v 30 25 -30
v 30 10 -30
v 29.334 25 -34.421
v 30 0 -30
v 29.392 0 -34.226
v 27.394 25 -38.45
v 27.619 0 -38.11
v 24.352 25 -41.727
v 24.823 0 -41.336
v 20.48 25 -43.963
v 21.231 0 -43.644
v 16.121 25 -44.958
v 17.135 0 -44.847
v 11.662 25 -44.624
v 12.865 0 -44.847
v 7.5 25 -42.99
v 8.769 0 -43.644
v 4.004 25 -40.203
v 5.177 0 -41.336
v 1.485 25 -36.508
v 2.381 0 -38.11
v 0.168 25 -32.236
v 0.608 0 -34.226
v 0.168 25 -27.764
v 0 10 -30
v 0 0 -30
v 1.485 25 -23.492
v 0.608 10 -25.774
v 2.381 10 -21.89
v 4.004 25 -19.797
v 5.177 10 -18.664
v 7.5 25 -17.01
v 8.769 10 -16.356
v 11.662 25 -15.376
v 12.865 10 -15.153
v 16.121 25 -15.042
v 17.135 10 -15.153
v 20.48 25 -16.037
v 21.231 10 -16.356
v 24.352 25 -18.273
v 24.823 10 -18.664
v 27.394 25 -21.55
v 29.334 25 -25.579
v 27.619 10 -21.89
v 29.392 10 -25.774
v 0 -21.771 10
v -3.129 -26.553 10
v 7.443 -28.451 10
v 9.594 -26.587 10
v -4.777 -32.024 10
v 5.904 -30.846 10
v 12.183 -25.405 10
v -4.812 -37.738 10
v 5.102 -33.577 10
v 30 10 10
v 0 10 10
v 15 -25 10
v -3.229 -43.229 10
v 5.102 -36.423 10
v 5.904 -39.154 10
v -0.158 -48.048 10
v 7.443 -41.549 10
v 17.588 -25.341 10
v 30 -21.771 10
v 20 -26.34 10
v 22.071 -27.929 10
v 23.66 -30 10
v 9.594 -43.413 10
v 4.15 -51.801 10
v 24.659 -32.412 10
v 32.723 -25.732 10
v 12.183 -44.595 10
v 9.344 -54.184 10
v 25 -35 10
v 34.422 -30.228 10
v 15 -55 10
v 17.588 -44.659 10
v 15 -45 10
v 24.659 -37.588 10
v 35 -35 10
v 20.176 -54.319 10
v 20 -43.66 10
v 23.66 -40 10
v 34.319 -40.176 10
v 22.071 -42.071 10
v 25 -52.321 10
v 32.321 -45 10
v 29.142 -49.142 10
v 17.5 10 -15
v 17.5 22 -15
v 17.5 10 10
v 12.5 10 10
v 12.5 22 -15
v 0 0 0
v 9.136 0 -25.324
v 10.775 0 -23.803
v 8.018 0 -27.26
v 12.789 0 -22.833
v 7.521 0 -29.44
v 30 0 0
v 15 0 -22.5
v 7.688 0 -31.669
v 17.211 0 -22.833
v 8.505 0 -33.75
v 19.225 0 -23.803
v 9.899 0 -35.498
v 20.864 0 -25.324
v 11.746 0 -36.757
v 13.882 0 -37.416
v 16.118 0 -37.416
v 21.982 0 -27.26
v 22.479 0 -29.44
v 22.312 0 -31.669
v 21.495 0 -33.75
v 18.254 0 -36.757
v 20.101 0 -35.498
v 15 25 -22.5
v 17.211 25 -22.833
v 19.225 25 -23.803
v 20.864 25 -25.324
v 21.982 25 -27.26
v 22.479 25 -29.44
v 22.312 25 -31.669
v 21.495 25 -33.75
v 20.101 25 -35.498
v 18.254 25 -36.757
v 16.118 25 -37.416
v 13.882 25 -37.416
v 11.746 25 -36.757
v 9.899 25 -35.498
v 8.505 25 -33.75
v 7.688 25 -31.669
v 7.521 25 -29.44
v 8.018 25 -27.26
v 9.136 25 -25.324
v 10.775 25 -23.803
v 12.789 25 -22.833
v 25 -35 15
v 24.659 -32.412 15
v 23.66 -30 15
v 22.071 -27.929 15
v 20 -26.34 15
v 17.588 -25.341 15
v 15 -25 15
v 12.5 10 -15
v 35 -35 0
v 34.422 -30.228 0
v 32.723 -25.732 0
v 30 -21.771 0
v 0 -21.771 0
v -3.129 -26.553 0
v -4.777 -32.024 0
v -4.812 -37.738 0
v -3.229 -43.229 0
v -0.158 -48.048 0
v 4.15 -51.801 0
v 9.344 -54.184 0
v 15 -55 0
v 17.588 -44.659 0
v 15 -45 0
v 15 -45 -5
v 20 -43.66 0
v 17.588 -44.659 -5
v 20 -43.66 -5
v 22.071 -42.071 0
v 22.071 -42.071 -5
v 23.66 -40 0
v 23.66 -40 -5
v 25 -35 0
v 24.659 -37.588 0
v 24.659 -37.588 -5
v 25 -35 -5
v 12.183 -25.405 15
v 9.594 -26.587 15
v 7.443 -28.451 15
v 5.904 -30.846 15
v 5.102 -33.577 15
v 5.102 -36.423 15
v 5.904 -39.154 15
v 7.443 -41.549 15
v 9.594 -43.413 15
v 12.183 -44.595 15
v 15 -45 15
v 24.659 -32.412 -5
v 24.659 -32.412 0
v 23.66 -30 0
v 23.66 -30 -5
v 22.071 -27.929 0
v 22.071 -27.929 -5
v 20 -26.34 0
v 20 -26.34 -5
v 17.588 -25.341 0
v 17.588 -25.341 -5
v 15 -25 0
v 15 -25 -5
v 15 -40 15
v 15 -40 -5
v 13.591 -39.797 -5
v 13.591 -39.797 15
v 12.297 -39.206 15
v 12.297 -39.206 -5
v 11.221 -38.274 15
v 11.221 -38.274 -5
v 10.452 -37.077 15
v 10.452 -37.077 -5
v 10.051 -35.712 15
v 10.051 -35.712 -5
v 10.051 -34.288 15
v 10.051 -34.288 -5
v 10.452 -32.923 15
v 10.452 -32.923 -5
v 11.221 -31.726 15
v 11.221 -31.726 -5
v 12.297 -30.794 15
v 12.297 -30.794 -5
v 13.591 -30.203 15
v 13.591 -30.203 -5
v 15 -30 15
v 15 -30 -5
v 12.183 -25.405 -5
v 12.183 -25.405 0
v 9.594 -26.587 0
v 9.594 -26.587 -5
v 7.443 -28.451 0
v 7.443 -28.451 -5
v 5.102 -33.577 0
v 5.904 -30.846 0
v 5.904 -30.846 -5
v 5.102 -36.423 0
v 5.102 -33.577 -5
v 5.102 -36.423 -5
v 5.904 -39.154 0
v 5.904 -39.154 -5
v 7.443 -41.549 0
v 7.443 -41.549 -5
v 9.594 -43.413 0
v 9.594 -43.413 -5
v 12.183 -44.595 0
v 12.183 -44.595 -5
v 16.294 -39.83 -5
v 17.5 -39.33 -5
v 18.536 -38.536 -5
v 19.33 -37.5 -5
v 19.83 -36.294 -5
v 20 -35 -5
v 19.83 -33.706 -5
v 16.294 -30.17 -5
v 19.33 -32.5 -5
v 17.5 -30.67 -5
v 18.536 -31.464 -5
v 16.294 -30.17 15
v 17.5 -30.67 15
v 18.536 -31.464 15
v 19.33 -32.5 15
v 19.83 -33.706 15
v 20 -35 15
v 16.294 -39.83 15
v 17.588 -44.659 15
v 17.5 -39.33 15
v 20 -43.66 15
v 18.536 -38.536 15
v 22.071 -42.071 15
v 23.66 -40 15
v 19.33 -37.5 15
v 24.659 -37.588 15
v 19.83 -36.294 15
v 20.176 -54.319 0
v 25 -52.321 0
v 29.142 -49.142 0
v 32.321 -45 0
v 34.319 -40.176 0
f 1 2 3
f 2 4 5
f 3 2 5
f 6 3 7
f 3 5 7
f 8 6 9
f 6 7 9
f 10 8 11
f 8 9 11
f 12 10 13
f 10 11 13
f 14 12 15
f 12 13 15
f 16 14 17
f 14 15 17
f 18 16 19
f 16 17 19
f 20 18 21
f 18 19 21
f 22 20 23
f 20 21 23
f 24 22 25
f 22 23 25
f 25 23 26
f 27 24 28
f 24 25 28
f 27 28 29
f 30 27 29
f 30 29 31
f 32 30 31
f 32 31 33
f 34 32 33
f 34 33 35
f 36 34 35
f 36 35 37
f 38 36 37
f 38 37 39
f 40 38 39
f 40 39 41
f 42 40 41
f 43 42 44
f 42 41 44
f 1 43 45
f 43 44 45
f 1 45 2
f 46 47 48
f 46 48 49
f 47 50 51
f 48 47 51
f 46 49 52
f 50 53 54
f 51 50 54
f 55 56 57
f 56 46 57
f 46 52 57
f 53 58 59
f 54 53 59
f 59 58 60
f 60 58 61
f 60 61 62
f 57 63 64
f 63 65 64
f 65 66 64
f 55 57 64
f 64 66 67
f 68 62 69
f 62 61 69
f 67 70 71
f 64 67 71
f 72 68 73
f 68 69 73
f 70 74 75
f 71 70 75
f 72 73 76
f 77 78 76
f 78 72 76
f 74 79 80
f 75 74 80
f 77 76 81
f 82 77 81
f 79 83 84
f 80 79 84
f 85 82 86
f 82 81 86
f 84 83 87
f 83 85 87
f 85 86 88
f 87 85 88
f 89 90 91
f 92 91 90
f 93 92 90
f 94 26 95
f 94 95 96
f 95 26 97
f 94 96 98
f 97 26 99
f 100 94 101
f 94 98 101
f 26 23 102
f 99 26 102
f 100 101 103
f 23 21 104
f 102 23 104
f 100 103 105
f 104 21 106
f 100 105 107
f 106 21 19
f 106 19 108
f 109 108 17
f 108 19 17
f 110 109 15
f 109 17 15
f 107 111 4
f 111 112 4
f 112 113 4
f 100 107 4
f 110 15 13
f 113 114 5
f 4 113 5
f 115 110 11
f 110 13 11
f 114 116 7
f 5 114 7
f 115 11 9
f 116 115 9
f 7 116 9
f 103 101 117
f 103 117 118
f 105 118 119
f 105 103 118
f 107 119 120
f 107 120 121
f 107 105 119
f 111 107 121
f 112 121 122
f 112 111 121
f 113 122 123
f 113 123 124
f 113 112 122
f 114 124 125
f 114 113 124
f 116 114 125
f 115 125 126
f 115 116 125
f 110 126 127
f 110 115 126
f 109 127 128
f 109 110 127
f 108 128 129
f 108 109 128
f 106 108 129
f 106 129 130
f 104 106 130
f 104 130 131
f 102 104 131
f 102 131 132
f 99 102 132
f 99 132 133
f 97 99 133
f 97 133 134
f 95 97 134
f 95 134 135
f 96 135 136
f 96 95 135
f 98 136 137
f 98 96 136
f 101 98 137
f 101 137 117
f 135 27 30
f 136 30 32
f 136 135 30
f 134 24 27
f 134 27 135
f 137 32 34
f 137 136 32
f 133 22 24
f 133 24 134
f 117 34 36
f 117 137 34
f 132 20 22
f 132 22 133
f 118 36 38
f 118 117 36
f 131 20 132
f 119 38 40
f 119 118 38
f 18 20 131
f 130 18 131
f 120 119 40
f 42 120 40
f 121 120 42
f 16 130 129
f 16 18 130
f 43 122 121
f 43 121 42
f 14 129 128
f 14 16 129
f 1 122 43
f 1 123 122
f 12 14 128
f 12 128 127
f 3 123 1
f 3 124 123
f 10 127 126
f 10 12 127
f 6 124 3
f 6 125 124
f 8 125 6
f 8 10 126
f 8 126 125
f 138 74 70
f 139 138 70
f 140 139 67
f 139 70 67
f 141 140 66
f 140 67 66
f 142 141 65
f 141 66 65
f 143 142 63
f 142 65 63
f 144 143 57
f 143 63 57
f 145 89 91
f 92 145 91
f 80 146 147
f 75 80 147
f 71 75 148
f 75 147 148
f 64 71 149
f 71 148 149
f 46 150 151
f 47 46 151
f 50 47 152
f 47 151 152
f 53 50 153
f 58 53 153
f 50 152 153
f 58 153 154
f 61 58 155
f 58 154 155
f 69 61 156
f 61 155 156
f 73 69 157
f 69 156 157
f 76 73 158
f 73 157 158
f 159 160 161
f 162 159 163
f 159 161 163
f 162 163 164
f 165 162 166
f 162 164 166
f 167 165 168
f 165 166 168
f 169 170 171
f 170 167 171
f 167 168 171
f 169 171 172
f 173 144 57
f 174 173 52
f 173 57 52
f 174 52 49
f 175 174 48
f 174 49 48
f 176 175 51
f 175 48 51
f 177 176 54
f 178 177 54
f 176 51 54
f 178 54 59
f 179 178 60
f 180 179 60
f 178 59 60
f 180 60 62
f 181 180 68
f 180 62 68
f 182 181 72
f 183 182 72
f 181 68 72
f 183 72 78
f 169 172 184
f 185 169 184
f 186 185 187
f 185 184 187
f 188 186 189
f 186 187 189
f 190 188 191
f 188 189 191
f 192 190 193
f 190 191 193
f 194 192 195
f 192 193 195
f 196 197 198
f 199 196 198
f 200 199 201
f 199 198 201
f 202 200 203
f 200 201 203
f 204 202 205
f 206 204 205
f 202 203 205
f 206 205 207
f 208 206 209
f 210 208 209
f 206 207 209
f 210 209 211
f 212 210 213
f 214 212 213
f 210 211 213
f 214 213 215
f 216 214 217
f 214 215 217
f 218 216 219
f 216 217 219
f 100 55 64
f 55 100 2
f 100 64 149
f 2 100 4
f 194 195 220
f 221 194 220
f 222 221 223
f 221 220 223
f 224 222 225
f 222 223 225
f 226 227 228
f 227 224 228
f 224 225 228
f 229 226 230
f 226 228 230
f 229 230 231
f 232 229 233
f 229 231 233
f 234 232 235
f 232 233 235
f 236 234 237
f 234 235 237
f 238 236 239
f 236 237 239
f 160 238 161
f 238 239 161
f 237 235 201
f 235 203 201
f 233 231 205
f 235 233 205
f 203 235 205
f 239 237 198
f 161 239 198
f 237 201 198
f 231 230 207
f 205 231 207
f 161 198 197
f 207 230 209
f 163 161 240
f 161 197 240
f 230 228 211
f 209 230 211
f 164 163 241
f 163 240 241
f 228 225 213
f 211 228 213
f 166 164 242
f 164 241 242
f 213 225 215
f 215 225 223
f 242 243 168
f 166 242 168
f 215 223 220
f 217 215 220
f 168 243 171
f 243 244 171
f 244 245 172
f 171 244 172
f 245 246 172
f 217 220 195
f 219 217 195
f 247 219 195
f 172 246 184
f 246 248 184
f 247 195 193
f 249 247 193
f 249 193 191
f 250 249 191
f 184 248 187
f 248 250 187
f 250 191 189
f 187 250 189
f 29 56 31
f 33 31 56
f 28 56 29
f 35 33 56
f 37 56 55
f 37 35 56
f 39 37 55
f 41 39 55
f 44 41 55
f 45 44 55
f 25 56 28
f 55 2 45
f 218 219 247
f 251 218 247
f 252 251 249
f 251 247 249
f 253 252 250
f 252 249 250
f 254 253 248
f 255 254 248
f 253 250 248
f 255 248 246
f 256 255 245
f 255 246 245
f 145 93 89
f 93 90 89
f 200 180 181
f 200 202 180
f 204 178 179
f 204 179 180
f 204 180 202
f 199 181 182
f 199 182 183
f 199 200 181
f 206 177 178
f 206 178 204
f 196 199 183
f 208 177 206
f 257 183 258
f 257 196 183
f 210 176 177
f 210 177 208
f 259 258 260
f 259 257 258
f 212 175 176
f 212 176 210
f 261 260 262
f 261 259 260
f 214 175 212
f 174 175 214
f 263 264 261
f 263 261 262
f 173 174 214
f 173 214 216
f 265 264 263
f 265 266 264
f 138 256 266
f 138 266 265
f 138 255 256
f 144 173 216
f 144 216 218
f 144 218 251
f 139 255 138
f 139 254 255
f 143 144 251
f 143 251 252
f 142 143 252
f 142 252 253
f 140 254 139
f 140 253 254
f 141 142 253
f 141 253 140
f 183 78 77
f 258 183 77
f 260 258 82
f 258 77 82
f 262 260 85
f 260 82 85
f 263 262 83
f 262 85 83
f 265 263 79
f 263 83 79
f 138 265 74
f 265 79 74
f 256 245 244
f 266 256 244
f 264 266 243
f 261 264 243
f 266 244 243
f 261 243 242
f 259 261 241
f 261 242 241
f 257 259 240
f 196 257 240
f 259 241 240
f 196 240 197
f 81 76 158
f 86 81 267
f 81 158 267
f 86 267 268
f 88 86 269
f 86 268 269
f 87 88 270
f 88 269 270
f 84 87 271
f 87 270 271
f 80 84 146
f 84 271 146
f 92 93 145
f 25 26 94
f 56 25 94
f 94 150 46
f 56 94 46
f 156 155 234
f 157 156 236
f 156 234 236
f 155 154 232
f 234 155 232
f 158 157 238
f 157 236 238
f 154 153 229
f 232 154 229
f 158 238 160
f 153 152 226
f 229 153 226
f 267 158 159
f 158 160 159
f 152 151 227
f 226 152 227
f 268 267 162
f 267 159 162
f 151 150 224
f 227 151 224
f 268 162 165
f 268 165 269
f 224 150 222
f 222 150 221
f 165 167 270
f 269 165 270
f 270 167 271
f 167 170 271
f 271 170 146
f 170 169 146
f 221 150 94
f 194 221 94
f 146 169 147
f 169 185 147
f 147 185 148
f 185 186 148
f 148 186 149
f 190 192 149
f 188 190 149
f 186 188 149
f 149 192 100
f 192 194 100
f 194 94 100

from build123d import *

# Parameters (mm, degrees)
SKETCH_1_R           = 10
EXTRUDE_1_DEPTH      = 10
EXTRUDE_2_DEPTH      = 15
EXTRUDE_2_DEPTH_BACK = 5
SKETCH_1_3_R         = 10
SKETCH_1_3_R_2       = 5
EXTRUDE_3_DEPTH      = 10
SKETCH_2_3_R         = 7.5
EXTRUDE_4_DEPTH      = 25
EXTRUDE_6_DEPTH      = 2.5


with BuildPart() as part:
    # 草图1 → 凸台-拉伸1 (new body)
    with BuildSketch(Plane.XY):
        with BuildLine():
            Line((0, 0), (0, -21.771243445))
            ThreePointArc((0, -21.771243445), (15, -55), (30, -21.771243445))
            Line((30, -21.771243445), (30, 0))
            Line((30, 0), (0, 0))
        make_face()
        with Locations((15, -35)):
            Circle(SKETCH_1_R, mode=Mode.SUBTRACT)
    extrude(amount=EXTRUDE_1_DEPTH)

    # 草图1<3> → 凸台-拉伸2 (add, two sides: drawn at the far end of the back side and taken through both)
    with BuildSketch(Plane.XY.offset(-EXTRUDE_2_DEPTH_BACK)):
        with Locations((15, -35)):
            Circle(SKETCH_1_3_R)
        with Locations((15, -35)):
            Circle(SKETCH_1_3_R_2, mode=Mode.SUBTRACT)
    extrude(amount=EXTRUDE_2_DEPTH + EXTRUDE_2_DEPTH_BACK)

    # 草图2 → 凸台-拉伸3 (add)
    with BuildSketch(Plane(origin=(0, 0, 0), x_dir=(1, 0, 0), z_dir=(0, 1, 0))):
        with BuildLine():
            Line((0, -10), (30, -10))
            Line((30, -10), (30, 30))
            ThreePointArc((30, 30), (15, 15), (0, 30))
            Line((0, 30), (0, -10))
        make_face()
    extrude(amount=EXTRUDE_3_DEPTH)

    # 草图2<3> → 凸台-拉伸4 (add)
    with BuildSketch(Plane(origin=(0, 0, 0), x_dir=(1, 0, 0), z_dir=(0, 1, 0))):
        with BuildLine():
            ThreePointArc((0, 30), (15, 15), (30, 30))
            ThreePointArc((30, 30), (15, 45), (0, 30))
        make_face()
        with Locations((15, 30)):
            Circle(SKETCH_2_3_R, mode=Mode.SUBTRACT)
    extrude(amount=EXTRUDE_4_DEPTH)


with BuildPart() as body_2:
    # 草图3 → 凸台-拉伸6 (new, symmetric)
    with BuildSketch(Plane(origin=(15, 0, 0), x_dir=(0, 0, -1), z_dir=(1, 0, 0))):
        Polygon((15, 10), (15, 22), (-10, 10), align=None)
    extrude(amount=EXTRUDE_6_DEPTH, both=True)


solid = Compound([part.part, body_2.part])
